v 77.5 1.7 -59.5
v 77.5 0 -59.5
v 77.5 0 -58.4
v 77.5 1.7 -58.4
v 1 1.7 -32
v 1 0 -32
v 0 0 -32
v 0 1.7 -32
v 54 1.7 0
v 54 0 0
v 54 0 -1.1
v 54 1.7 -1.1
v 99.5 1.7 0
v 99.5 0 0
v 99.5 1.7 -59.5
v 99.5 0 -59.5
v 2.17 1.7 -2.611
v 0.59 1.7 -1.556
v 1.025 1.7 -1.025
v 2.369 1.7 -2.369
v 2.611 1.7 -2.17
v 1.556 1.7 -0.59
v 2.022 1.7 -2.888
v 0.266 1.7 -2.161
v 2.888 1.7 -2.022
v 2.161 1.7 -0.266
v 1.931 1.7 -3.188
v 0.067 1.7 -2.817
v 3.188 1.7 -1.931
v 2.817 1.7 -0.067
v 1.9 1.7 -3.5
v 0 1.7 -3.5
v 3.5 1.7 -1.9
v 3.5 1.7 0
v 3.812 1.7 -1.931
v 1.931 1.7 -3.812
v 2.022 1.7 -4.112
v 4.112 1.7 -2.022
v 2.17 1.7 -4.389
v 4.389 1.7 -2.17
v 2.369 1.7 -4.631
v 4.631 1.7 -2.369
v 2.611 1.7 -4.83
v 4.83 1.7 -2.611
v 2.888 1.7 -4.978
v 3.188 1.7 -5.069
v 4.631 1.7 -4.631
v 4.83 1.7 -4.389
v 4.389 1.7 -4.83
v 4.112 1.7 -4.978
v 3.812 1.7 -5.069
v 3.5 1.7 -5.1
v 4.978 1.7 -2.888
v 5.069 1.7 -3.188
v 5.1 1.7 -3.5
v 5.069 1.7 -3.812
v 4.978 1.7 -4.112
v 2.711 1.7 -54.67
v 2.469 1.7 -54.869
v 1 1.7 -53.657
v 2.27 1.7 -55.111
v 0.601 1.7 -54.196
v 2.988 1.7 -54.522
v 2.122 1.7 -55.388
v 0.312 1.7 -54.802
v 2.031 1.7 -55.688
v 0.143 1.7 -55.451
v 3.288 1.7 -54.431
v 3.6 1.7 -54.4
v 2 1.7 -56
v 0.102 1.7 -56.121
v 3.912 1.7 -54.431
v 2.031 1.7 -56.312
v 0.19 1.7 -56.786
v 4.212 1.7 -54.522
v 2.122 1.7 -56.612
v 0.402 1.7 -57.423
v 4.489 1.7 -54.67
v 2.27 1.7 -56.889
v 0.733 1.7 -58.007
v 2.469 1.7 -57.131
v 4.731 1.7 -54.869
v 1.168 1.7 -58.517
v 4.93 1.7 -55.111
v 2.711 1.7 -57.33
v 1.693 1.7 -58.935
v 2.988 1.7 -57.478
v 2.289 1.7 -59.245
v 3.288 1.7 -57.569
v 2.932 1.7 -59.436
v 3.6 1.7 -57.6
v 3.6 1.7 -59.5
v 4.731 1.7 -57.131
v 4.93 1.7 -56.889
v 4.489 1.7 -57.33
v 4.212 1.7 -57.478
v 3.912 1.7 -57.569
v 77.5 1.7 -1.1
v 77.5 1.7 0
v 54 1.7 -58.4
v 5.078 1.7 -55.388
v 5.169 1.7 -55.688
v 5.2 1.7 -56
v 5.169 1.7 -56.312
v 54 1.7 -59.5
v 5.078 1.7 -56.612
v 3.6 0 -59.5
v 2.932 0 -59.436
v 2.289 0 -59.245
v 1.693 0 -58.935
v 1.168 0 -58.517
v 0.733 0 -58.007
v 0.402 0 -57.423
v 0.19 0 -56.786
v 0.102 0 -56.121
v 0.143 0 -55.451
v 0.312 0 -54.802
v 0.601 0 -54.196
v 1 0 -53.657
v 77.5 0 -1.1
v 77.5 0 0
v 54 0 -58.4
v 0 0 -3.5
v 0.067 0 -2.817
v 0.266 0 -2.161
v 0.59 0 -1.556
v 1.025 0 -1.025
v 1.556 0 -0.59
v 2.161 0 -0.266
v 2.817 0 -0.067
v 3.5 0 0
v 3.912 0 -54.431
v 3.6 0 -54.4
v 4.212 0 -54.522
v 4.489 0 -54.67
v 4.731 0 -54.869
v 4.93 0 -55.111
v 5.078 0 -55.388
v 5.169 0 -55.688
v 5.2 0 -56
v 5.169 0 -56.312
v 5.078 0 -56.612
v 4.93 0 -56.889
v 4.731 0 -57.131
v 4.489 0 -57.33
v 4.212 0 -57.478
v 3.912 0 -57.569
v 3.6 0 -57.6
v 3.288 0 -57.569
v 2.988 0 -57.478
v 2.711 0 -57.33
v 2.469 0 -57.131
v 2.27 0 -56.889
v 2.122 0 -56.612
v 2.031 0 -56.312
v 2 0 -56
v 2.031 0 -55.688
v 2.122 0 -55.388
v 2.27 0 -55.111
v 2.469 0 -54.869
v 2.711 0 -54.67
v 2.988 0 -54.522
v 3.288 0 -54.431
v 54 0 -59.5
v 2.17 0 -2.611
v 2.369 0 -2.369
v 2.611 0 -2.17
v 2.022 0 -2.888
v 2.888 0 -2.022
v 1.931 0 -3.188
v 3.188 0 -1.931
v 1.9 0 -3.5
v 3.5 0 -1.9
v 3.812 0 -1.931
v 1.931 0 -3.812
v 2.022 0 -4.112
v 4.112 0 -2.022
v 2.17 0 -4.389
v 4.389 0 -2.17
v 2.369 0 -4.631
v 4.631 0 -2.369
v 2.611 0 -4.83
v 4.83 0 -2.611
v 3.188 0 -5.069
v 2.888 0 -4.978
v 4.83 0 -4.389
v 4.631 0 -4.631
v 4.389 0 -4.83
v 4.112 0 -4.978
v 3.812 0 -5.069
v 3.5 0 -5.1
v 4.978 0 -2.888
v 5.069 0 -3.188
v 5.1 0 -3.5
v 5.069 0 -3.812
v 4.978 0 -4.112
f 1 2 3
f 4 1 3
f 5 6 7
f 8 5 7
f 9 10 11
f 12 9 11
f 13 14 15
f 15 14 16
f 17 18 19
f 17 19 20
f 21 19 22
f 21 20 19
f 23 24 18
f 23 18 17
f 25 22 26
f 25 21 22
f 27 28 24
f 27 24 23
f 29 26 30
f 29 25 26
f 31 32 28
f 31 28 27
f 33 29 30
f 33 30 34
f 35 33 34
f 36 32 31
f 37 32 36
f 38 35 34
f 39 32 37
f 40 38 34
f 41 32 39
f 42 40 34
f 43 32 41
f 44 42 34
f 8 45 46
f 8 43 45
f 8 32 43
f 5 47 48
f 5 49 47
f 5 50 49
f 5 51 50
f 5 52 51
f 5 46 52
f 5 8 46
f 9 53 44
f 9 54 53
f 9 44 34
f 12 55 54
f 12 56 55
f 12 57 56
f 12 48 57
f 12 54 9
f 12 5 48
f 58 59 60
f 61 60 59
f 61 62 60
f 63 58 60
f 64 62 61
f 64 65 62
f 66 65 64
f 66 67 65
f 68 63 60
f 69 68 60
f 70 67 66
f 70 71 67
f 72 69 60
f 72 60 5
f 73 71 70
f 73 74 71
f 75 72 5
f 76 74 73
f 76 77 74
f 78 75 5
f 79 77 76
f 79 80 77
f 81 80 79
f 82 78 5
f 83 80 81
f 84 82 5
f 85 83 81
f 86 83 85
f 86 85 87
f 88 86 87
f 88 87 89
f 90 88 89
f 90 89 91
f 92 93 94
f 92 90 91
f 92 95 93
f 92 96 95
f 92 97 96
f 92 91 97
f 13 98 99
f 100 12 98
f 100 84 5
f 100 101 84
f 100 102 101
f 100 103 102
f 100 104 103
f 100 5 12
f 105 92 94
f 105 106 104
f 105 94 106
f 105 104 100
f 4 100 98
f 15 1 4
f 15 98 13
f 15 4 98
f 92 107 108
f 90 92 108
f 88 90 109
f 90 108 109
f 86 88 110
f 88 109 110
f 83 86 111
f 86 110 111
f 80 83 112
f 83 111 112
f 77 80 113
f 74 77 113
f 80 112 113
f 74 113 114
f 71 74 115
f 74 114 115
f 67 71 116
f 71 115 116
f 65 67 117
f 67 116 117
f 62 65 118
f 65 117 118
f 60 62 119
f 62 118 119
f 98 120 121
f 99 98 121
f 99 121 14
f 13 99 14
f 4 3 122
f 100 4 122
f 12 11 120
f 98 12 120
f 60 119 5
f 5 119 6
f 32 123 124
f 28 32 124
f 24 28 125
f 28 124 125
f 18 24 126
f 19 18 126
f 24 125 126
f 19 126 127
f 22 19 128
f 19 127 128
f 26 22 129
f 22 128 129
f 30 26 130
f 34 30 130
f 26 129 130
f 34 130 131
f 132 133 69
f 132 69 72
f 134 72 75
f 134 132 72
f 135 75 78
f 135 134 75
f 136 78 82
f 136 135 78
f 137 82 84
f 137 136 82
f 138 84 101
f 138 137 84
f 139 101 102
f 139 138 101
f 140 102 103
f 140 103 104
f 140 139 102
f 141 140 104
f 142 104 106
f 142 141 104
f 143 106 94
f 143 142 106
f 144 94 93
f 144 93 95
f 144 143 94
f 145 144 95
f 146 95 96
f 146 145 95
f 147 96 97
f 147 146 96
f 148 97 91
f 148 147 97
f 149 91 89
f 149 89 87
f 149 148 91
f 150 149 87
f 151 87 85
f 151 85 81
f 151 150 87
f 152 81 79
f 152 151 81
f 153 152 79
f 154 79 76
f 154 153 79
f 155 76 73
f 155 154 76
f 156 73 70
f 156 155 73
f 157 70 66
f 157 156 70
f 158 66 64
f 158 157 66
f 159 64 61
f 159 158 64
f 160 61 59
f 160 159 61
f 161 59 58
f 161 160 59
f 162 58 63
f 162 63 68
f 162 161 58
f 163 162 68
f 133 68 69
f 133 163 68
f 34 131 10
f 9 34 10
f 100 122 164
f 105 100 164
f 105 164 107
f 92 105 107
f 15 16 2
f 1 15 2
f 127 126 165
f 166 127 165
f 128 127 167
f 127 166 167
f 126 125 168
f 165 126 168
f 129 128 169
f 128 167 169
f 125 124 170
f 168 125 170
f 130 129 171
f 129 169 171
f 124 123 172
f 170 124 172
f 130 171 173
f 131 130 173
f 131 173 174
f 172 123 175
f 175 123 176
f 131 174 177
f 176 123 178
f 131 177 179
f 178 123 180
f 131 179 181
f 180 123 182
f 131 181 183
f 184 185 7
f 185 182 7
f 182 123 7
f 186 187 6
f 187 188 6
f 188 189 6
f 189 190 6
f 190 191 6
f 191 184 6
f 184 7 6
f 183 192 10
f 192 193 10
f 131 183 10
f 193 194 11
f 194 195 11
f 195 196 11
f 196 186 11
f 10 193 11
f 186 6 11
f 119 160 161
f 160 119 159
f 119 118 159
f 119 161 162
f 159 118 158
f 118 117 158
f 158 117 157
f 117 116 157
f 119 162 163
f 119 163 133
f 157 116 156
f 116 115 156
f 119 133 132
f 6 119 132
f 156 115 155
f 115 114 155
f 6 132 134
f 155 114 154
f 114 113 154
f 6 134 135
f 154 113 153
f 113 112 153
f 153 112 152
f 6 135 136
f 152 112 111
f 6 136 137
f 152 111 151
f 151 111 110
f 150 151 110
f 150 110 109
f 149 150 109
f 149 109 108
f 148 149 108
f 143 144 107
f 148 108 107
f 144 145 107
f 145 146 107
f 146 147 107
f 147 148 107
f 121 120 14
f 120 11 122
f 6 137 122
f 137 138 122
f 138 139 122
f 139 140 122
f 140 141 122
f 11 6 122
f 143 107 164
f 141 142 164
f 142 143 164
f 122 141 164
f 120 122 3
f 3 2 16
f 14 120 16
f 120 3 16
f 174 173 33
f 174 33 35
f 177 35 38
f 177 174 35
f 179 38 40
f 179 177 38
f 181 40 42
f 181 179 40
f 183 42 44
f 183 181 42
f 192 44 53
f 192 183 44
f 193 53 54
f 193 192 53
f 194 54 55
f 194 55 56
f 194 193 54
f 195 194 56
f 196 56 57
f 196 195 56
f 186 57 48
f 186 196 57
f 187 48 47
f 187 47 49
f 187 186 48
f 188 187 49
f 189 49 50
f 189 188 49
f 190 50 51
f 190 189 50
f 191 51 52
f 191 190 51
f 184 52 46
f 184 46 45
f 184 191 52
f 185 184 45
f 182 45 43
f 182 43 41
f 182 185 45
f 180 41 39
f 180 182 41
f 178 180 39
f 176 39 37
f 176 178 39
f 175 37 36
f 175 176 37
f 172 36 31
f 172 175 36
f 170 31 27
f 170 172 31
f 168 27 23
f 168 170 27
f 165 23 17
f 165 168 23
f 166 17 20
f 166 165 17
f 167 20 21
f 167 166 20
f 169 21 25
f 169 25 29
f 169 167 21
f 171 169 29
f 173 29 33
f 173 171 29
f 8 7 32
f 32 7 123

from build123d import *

# Parameters (mm, degrees)
SKETCH1_R           = 1.6
BOSS_EXTRUDE1_DEPTH = 1.7


with BuildPart() as part:
    # Sketch1 → Boss-Extrude1 (new body)
    with BuildSketch(Plane(origin=(0, 0, 0), x_dir=(1, 0, 0), z_dir=(0, 1, 0))):
        with BuildLine():
            ThreePointArc((0, 3.5), (1.025126266, 1.025126266), (3.5, 0))
            Line((3.5, 0), (54, 0))
            Line((54, 0), (54, 1.1))
            Line((54, 1.1), (77.5, 1.1))
            Line((77.5, 1.1), (77.5, 0))
            Line((77.5, 0), (99.5, 0))
            Line((99.5, 0), (99.5, 59.5))
            Line((99.5, 59.5), (77.5, 59.5))
            Line((77.5, 59.5), (77.5, 58.4))
            Line((77.5, 58.4), (54, 58.4))
            Line((54, 58.4), (54, 59.5))
            Line((54, 59.5), (3.6, 59.5))
            ThreePointArc((3.6, 59.5), (0.402285022, 57.422891043), (1, 53.656925097))
            Line((1, 53.656925097), (1, 32))
            Line((1, 32), (0, 32))
            Line((0, 32), (0, 3.5))
        make_face()
        with Locations(Location((3.5, 3.5, 0), (0, 0, 270))):
            Circle(SKETCH1_R, mode=Mode.SUBTRACT)
        with Locations(Location((3.6, 56, 0), (0, 0, 270))):
            Circle(SKETCH1_R, mode=Mode.SUBTRACT)
    extrude(amount=BOSS_EXTRUDE1_DEPTH)


solid = part.part
